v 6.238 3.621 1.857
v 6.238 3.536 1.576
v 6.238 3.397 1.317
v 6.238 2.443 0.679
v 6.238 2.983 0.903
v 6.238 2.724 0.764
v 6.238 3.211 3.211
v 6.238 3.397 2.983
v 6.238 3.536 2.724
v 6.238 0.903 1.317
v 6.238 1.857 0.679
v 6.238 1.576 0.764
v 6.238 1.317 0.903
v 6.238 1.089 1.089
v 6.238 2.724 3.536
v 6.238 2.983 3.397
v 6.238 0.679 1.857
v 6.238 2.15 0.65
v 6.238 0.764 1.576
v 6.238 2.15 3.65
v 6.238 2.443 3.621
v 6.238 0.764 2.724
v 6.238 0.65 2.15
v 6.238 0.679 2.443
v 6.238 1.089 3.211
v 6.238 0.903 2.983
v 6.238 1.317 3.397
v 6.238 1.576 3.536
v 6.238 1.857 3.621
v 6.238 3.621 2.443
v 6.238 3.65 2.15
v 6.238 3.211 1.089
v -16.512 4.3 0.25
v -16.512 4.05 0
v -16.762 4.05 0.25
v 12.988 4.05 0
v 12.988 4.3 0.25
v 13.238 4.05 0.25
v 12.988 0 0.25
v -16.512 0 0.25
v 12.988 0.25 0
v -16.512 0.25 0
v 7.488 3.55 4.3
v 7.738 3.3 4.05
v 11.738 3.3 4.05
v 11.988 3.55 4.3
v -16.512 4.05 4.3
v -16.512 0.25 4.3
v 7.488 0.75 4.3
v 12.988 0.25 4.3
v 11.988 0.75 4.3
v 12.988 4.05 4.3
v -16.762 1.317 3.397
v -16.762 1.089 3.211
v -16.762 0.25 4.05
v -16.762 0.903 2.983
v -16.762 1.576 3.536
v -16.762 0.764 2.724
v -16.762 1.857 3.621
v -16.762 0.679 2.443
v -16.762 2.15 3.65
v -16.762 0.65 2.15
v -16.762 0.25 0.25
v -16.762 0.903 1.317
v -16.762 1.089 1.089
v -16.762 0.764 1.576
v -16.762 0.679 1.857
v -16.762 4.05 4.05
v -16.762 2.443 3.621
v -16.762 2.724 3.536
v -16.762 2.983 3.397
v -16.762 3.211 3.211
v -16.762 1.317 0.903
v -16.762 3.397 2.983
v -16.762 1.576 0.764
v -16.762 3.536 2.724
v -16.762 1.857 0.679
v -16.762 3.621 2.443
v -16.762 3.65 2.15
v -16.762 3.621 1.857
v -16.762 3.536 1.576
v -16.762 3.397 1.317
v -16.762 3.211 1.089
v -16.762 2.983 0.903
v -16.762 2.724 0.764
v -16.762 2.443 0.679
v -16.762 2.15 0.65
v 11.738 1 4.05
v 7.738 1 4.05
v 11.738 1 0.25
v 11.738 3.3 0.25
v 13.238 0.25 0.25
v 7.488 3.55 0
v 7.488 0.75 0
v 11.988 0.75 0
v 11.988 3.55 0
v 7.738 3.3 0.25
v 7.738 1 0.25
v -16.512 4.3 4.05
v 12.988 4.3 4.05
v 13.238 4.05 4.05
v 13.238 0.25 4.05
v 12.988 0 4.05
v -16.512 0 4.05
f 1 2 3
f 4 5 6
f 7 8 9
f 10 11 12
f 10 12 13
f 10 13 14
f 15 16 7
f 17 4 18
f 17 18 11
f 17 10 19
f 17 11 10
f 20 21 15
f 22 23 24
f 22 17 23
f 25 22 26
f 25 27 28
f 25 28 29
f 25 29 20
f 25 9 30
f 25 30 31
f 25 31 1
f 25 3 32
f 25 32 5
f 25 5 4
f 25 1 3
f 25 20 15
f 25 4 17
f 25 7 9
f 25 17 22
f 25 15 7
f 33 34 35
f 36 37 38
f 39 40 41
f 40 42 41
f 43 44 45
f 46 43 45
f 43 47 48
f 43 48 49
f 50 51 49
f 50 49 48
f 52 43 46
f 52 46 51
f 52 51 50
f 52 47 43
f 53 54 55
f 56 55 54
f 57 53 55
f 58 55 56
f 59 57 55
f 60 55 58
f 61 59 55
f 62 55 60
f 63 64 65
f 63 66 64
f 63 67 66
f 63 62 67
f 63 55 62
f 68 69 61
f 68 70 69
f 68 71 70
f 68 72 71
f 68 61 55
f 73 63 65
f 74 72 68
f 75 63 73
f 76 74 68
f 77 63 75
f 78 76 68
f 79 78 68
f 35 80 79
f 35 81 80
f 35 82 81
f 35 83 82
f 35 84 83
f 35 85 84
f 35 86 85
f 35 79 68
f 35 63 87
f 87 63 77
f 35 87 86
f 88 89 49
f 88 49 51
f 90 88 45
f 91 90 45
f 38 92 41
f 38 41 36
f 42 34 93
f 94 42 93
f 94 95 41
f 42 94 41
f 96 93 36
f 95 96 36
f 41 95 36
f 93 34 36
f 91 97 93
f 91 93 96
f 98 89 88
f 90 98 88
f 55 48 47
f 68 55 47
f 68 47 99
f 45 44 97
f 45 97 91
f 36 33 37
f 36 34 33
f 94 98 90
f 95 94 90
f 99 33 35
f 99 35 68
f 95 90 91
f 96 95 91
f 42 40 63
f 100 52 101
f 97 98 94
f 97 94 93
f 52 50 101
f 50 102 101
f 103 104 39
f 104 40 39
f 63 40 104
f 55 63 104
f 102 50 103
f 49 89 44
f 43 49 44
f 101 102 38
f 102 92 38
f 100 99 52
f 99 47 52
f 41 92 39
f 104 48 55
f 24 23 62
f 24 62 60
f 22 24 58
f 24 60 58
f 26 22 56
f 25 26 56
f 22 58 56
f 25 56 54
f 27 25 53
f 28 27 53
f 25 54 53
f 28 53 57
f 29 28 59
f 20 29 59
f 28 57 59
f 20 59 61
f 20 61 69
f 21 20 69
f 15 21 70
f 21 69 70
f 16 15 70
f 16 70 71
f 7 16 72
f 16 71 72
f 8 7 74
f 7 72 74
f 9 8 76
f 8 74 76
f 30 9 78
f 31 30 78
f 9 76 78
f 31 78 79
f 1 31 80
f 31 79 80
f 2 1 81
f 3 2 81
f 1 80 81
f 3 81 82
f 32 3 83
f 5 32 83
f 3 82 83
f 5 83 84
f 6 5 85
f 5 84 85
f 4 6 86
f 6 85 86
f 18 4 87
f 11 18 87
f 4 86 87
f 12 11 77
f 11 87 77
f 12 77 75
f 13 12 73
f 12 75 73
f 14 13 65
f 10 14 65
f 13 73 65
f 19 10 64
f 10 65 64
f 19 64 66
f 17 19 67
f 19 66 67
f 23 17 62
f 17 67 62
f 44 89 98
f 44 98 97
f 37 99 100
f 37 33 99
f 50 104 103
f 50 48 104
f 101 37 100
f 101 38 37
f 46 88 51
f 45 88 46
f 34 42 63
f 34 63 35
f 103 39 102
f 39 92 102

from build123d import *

# Parameters (mm, degrees)
F0_W     = 30
F0_H     = 4.3
F1_DEPTH = 4.3
F2_W     = 4
F2_H     = 2.3
F6_DEPTH = 4.301
F3_SIZE  = 0.25
F4_R     = 1.5
F5_DEPTH = 23


with BuildPart() as f1:
    # F0 (on Top) → F1 (new body)
    with BuildSketch(Plane.XY):
        with Locations((-1.762214, 2.15)):
            Rectangle(F0_W, F0_H)
    extrude(amount=F1_DEPTH)

    # F2 (on face) → F6 (cut, through all)
    with BuildSketch(Plane.XY.offset(4.3)):
        with Locations((9.737786, 2.15)):
            Rectangle(F2_W, F2_H)
    extrude(amount=-F6_DEPTH, mode=Mode.SUBTRACT)

    # F3
    f3_edges = [f1.edges().sort_by_distance(p)[0] for p in [
        (13.237786, 2.15, 4.3),
        (-1.762214, 0, 4.3),
        (-1.762214, 4.3, 4.3),
        (13.237786, 0, 2.15),
        (13.237786, 4.3, 2.15),
        (-1.762214, 4.3, 0),
        (13.237786, 2.15, 0),
        (-1.762214, 0, 0),
        (9.737786, 3.3, 0),
        (7.737786, 2.15, 0),
        (9.737786, 1, 0),
        (11.737786, 2.15, 0),
        (7.737786, 2.15, 4.3),
        (11.737786, 2.15, 4.3),
        (9.737786, 3.3, 4.3),
        (9.737786, 1, 4.3),
        (-16.762214, 2.15, 4.3),
        (-16.762214, 0, 2.15),
        (-16.762214, 2.15, 0),
        (-16.762214, 4.3, 2.15),
    ]]
    chamfer(f3_edges, length=F3_SIZE)

    # F4 (on face) → F5 (cut)
    with BuildSketch(Plane(origin=(-16.762214, 0, 0), x_dir=(0, -1, 0), z_dir=(-1, 0, 0))):
        with Locations((-2.15, 2.15)):
            Circle(F4_R)
    extrude(amount=-F5_DEPTH, mode=Mode.SUBTRACT)


solid = f1.part
